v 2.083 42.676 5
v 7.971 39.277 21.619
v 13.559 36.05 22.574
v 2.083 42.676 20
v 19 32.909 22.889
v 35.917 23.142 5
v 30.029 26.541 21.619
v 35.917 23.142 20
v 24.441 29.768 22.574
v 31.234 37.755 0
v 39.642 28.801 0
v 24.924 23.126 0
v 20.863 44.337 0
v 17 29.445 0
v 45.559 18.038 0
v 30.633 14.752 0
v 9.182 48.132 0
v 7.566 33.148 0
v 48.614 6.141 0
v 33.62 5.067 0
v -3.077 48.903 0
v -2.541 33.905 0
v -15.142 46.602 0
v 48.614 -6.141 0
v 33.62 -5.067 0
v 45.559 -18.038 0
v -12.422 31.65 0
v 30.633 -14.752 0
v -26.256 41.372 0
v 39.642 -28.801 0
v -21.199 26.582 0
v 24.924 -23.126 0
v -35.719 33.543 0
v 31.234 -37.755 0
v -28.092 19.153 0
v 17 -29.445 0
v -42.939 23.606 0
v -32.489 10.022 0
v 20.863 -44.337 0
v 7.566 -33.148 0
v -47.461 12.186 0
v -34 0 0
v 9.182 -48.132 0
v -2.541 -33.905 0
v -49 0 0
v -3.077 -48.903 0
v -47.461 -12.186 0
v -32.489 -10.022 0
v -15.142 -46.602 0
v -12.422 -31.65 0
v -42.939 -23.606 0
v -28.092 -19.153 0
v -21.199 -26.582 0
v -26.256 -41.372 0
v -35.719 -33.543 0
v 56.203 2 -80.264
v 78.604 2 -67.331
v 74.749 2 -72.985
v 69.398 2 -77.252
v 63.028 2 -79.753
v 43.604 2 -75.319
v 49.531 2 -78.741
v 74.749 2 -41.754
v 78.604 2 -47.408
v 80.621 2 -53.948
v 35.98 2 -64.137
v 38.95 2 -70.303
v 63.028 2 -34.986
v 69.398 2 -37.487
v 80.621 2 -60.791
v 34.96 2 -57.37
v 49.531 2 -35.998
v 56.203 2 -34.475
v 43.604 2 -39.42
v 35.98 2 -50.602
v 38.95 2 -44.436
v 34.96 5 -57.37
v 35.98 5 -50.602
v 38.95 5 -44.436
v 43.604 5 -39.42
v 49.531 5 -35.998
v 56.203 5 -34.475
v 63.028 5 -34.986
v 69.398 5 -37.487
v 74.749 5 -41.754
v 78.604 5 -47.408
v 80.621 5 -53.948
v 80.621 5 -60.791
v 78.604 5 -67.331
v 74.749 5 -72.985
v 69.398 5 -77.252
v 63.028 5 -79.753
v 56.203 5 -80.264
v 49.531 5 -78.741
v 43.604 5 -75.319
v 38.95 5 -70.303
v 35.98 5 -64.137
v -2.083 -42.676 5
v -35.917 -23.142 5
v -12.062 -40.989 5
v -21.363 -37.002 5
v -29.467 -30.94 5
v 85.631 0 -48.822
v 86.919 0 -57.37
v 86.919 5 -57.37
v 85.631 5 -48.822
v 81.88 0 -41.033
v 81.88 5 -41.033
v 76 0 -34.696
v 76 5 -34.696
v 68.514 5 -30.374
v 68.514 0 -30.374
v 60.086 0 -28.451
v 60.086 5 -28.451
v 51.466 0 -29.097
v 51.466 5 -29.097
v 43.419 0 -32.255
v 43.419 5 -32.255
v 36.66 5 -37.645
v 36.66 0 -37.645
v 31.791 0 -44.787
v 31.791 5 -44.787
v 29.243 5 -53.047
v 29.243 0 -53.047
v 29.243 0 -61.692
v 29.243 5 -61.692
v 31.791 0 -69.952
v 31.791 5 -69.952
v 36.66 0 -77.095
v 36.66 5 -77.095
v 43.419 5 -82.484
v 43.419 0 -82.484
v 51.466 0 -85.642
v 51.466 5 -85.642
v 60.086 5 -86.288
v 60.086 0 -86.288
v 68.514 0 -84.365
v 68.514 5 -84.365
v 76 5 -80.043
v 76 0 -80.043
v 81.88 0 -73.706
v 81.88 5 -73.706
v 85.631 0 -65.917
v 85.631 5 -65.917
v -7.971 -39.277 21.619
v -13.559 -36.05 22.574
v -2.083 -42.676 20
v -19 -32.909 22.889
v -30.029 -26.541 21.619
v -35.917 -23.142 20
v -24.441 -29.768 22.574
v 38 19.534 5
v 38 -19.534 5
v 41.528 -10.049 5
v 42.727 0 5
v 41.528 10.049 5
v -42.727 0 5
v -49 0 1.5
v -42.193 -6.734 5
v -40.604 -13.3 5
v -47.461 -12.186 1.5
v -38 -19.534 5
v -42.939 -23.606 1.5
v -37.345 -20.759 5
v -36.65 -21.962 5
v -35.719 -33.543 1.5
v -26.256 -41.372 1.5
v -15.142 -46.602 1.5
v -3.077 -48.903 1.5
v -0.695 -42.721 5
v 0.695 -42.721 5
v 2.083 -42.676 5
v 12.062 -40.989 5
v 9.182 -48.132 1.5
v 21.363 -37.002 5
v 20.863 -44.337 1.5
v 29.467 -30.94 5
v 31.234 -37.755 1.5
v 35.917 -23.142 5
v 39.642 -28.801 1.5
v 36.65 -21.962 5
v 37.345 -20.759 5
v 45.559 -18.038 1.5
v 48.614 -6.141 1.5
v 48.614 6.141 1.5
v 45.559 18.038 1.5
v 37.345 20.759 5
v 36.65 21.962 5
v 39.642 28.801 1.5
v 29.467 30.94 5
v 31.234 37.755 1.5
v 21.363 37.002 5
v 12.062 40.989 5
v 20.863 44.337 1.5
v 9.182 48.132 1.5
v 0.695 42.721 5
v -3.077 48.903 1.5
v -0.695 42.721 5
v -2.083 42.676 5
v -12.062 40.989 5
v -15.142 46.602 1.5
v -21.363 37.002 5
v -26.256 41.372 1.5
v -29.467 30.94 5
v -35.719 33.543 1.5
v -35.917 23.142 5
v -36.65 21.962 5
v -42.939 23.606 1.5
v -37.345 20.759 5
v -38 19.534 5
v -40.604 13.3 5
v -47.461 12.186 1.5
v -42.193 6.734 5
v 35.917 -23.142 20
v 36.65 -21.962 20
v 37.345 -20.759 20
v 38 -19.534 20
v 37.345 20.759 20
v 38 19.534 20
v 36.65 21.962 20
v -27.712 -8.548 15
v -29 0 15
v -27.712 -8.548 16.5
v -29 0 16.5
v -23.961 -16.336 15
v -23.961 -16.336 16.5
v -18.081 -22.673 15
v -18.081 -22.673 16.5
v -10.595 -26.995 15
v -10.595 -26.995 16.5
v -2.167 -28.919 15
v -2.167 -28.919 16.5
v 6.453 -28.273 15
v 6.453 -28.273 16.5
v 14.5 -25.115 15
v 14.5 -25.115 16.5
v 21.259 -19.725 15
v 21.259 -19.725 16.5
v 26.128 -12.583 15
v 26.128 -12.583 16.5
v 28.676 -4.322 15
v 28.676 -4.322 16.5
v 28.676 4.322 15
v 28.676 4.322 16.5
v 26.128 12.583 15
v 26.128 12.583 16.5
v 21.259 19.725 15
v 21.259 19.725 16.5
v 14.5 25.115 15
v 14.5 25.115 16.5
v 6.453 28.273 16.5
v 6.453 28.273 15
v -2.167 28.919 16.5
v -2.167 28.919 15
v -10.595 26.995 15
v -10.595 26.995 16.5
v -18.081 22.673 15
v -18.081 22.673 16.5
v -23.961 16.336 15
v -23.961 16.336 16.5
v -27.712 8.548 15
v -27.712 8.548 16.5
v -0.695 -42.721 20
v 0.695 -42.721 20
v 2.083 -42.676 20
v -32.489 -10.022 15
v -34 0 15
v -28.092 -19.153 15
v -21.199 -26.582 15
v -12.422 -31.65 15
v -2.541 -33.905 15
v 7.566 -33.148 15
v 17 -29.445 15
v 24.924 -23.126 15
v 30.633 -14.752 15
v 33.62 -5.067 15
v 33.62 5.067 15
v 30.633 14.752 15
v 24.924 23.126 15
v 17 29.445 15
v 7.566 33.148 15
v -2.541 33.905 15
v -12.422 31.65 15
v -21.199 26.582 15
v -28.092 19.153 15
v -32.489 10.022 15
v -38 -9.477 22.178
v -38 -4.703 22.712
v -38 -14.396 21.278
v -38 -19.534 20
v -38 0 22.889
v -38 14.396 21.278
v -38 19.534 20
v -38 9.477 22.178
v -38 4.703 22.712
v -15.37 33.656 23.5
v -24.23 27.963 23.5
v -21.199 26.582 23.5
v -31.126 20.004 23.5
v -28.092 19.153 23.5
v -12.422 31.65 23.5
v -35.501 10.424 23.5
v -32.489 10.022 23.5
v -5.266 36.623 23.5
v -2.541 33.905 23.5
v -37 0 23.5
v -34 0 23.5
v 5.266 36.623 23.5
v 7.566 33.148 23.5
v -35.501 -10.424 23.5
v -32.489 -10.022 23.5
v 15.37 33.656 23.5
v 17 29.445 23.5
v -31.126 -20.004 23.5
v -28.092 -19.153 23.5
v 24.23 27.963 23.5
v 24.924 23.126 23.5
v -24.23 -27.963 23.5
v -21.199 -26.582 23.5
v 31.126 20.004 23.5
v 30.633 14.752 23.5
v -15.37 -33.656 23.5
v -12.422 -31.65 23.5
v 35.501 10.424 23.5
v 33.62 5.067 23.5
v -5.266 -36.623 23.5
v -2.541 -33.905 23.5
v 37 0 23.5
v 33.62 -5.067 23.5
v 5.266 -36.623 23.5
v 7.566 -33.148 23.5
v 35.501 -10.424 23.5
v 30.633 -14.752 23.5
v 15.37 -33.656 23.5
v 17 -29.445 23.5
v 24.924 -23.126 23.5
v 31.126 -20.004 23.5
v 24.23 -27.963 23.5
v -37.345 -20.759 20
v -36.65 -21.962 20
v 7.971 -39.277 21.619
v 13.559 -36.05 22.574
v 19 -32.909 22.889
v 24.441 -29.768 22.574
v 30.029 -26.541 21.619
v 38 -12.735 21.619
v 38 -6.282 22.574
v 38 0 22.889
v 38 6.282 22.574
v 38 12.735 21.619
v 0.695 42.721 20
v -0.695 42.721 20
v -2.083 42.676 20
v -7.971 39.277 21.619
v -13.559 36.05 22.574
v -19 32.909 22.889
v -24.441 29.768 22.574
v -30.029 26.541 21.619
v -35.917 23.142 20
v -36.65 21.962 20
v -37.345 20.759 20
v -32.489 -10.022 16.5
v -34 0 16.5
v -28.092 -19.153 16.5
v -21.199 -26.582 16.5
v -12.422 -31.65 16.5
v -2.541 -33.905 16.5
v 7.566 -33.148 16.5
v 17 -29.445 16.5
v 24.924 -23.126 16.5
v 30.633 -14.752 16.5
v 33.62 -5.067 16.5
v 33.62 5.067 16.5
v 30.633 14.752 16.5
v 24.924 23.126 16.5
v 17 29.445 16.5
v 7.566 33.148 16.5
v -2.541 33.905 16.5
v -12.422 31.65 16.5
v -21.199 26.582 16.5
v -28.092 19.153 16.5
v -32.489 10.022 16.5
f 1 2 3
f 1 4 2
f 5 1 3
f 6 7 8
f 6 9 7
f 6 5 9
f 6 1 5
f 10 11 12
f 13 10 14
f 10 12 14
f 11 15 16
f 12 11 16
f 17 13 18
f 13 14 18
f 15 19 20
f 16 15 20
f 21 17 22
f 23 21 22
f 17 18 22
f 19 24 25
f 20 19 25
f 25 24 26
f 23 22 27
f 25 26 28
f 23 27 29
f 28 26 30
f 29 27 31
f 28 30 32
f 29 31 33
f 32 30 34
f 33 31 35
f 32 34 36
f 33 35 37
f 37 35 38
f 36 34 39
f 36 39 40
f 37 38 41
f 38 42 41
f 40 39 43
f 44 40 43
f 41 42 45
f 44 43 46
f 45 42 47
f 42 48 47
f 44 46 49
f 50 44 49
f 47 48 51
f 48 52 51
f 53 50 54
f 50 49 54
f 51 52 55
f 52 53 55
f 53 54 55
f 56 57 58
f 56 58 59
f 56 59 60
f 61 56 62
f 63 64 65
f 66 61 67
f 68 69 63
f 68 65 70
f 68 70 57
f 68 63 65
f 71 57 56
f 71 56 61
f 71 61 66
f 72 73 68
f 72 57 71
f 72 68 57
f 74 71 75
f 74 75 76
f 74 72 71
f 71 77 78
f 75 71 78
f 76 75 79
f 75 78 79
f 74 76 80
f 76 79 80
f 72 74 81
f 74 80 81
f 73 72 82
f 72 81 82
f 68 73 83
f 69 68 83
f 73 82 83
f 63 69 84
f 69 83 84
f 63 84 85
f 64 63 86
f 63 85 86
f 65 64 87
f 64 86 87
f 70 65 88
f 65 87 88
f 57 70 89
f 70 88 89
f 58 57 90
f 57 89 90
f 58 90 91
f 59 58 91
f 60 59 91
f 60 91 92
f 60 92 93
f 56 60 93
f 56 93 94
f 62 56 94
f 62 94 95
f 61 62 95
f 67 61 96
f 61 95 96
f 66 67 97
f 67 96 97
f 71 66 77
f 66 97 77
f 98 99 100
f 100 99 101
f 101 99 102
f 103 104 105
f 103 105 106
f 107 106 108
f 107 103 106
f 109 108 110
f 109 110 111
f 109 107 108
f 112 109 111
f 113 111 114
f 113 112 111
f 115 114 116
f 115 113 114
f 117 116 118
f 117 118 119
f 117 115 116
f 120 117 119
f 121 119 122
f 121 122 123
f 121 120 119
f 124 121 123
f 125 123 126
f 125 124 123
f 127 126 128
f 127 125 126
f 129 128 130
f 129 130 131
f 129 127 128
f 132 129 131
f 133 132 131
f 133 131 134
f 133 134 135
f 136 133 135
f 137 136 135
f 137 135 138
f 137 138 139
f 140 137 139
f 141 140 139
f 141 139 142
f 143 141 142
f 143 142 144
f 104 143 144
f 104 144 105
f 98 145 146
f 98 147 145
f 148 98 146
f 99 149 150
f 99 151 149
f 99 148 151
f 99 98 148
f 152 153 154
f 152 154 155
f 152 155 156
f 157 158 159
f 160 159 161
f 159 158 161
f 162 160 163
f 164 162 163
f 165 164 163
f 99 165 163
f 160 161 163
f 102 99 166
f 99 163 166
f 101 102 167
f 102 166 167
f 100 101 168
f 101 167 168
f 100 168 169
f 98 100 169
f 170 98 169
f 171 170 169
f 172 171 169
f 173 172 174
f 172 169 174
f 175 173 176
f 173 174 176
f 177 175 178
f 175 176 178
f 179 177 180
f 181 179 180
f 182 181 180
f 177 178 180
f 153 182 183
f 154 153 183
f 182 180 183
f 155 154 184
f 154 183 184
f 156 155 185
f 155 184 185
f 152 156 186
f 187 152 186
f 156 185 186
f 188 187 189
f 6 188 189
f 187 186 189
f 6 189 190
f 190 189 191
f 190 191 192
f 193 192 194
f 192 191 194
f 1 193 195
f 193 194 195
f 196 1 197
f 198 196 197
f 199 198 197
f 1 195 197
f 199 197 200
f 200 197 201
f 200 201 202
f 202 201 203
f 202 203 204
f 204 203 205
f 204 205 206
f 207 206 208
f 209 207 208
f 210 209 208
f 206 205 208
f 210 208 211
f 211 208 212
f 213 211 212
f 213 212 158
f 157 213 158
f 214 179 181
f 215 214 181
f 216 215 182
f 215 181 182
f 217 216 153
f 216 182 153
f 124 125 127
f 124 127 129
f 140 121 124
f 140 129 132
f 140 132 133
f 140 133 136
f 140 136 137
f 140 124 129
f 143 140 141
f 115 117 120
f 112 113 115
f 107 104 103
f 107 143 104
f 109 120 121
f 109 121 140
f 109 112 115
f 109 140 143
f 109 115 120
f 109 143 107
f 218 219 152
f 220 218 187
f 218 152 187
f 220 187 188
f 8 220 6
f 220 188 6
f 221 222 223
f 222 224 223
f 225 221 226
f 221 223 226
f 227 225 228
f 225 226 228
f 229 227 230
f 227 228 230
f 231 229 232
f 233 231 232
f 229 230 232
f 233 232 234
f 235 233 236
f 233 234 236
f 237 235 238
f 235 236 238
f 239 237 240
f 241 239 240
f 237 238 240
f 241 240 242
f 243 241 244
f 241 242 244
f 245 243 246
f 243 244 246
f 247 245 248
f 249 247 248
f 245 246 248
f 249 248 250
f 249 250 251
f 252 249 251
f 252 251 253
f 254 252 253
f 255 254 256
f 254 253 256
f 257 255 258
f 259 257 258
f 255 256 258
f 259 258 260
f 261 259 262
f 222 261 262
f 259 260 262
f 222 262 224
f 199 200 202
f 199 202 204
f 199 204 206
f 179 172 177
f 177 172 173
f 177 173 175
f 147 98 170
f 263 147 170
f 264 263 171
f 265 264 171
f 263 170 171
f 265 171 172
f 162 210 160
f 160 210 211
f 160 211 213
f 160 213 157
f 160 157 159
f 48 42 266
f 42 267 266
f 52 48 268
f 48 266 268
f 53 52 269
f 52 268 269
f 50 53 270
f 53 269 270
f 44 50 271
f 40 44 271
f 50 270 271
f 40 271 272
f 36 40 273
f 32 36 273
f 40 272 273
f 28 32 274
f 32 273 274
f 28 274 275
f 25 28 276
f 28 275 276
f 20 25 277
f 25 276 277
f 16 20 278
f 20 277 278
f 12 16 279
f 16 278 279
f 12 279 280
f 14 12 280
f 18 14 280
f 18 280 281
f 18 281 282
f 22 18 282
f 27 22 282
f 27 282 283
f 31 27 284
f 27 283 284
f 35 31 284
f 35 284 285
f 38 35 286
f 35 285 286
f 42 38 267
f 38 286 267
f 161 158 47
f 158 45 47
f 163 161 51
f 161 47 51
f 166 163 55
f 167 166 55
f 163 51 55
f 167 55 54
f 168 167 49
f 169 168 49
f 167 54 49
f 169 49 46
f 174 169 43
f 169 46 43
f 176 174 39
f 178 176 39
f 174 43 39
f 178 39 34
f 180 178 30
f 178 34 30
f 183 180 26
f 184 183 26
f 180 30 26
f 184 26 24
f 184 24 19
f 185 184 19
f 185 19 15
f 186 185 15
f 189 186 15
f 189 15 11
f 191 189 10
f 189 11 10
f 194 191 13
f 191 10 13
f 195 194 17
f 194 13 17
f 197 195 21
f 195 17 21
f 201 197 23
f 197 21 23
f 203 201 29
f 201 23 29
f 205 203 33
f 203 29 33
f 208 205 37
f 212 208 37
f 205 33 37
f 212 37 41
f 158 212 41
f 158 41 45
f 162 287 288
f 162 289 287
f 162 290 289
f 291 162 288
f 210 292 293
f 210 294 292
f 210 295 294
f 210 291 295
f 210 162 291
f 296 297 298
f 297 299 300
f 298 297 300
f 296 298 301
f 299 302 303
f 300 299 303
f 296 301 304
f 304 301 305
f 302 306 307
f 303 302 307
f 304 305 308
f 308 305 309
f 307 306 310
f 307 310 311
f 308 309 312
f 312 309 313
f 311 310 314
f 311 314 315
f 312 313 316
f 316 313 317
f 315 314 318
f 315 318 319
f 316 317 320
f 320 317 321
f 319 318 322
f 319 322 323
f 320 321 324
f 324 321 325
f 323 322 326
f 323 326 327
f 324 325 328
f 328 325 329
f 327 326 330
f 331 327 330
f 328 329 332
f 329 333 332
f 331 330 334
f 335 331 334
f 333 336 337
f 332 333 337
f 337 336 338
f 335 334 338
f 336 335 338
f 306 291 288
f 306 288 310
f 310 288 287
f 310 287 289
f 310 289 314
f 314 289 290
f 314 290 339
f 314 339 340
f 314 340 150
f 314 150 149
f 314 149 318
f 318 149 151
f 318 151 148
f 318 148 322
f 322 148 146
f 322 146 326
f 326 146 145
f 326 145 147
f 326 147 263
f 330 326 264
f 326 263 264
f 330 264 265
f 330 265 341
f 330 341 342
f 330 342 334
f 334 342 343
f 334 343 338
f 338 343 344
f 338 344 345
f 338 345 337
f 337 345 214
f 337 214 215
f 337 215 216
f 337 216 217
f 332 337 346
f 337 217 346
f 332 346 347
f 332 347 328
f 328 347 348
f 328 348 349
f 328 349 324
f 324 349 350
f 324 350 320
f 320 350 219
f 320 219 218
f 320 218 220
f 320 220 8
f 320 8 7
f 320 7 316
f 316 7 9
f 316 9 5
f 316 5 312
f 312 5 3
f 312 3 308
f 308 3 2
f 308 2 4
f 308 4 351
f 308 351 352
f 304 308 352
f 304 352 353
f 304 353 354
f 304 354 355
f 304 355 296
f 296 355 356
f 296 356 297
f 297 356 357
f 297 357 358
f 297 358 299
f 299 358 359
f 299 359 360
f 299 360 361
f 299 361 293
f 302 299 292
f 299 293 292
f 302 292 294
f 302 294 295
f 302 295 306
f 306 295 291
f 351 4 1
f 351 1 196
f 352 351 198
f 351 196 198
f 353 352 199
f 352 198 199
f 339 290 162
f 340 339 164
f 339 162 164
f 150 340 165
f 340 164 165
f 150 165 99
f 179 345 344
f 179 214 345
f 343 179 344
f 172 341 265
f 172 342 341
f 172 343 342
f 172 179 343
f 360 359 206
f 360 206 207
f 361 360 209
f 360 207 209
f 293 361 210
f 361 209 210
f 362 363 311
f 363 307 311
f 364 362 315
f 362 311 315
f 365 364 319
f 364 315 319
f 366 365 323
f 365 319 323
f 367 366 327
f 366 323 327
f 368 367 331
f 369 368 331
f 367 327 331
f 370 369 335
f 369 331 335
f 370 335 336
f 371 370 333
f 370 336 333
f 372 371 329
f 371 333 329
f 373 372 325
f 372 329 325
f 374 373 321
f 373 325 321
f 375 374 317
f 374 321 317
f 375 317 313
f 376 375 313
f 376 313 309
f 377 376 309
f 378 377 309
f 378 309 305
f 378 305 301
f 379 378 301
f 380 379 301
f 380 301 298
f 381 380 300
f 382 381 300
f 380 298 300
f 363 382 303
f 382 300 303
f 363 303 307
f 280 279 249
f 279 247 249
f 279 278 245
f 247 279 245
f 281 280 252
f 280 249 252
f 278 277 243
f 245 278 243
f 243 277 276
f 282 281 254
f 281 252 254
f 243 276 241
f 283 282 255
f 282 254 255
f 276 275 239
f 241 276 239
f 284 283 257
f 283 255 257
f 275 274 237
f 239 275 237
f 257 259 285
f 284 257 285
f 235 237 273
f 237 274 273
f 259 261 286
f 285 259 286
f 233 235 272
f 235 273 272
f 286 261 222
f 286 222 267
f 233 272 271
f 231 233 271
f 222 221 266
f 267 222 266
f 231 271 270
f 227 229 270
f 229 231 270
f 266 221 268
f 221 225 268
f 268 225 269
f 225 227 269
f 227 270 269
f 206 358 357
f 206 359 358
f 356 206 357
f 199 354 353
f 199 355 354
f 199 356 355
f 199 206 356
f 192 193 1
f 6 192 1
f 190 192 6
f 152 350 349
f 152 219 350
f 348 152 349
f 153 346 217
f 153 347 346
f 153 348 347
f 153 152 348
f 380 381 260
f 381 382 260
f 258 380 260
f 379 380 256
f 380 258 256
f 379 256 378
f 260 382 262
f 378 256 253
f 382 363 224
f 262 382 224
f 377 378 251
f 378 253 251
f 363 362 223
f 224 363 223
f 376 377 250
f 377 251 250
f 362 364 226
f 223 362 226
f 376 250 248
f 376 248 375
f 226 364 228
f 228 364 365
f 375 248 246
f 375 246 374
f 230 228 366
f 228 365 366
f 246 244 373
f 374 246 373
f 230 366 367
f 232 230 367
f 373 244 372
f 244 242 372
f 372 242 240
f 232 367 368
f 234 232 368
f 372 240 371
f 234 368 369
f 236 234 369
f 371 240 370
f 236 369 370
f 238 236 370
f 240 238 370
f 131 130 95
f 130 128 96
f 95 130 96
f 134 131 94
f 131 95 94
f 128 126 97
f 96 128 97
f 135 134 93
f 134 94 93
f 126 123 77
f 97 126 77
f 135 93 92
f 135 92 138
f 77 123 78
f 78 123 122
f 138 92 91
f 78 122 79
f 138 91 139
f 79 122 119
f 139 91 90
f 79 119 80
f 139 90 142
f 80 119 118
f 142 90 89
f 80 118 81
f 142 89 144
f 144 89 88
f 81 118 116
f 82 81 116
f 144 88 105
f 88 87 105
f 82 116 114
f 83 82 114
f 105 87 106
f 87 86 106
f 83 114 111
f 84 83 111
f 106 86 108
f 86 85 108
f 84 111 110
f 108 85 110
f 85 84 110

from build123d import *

# Parameters (mm, degrees)
F3_START  = 5
F3_DEPTH  = 24.3
F4_R      = 29
F4_R_2    = 25
F5_DEPTH  = 5
F5_FACE_R = 29
F6_DEPTH  = 3
F7_R      = 22.958760834
F8_DEPTH  = 3


with BuildPart() as f1:
    # F0 (on Front) → F1 (revolve)
    with BuildSketch(Plane.XZ):
        Polygon((-49, 0), (-34, 0), (-34, 15), (-29, 15), (-29, 16.5), (-34, 16.5), (-34, 23.5), (-37, 23.5), (-42.7267885808, 20), (-42.7267885808, 5), (-49, 1.5), align=None)
    revolve(axis=Axis((0, 0, 10.3921918198), (0, 0, 1)))

    # F2 (on Top) → F3 (cut)
    with BuildSketch(Plane.XY.offset(F3_START)):
        with BuildLine():
            Line((-38, -21.787268535), (-38, 21.787268535))
            ThreePointArc((-38, 21.787268535), (-43.8027975159, 0), (-38, -21.787268535))
        make_face()
        with BuildLine():
            Line((-0.1316719696, -43.8025996113), (-37.8683280304, -22.0153310763))
            ThreePointArc((-37.8683280304, -22.0153310763), (-21.9013987579, -37.9343354056), (-0.1316719696, -43.8025996113))
        make_face()
        with BuildLine():
            Line((37.8683280304, -22.0153310763), (0.1316719696, -43.8025996113))
            ThreePointArc((0.1316719696, -43.8025996113), (21.9013987579, -37.9343354056), (37.8683280304, -22.0153310763))
        make_face()
        with BuildLine():
            Line((38, 21.787268535), (38, -21.787268535))
            ThreePointArc((38, -21.787268535), (43.8027975159, 0), (38, 21.787268535))
        make_face()
        with BuildLine():
            Line((0.1316719696, 43.8025996113), (37.8683280304, 22.0153310763))
            ThreePointArc((37.8683280304, 22.0153310763), (21.9013987579, 37.9343354056), (0.1316719696, 43.8025996113))
        make_face()
        with BuildLine():
            Line((-37.8683280304, 22.0153310763), (-0.1316719696, 43.8025996113))
            ThreePointArc((-0.1316719696, 43.8025996113), (-21.9013987579, 37.9343354056), (-37.8683280304, 22.0153310763))
        make_face()
    extrude(amount=F3_DEPTH, mode=Mode.SUBTRACT)


with BuildPart() as f5:
    # F4 (on Front) → F5 (new body)
    with BuildSketch(Plane.XZ):
        with Locations((57.9189360142, -57.369556278)):
            Circle(F4_R)
        with Locations((57.9189360142, -57.369556278)):
            Circle(F4_R_2, mode=Mode.SUBTRACT)
        with Locations((57.9189360142, -57.369556278)):
            Circle(F4_R_2)
    extrude(amount=-F5_DEPTH)

    # F4 (on Front) + F5_face (on face) → F6 (join)
    with BuildSketch(Plane.XZ):
        with Locations((57.9189360142, -57.369556278)):
            Circle(F4_R)
        with Locations((57.9189360142, -57.369556278)):
            Circle(F4_R_2, mode=Mode.SUBTRACT)
    with BuildSketch(Plane(origin=(57.9189360142, 0, -57.369556278), x_dir=(1, 0, 0), z_dir=(0, -1, 0))):
        Circle(F5_FACE_R)
    extrude(amount=-F6_DEPTH)

    # F7 (on face) → F8 (cut)
    with BuildSketch(Plane(origin=(0, 5, 0), x_dir=(-1, 0, 0), z_dir=(0, 1, 0))):
        with Locations((-57.9189360142, -57.369556278)):
            Circle(F7_R)
    extrude(amount=-F8_DEPTH, mode=Mode.SUBTRACT)


solid = Compound([f1.part, f5.part])
